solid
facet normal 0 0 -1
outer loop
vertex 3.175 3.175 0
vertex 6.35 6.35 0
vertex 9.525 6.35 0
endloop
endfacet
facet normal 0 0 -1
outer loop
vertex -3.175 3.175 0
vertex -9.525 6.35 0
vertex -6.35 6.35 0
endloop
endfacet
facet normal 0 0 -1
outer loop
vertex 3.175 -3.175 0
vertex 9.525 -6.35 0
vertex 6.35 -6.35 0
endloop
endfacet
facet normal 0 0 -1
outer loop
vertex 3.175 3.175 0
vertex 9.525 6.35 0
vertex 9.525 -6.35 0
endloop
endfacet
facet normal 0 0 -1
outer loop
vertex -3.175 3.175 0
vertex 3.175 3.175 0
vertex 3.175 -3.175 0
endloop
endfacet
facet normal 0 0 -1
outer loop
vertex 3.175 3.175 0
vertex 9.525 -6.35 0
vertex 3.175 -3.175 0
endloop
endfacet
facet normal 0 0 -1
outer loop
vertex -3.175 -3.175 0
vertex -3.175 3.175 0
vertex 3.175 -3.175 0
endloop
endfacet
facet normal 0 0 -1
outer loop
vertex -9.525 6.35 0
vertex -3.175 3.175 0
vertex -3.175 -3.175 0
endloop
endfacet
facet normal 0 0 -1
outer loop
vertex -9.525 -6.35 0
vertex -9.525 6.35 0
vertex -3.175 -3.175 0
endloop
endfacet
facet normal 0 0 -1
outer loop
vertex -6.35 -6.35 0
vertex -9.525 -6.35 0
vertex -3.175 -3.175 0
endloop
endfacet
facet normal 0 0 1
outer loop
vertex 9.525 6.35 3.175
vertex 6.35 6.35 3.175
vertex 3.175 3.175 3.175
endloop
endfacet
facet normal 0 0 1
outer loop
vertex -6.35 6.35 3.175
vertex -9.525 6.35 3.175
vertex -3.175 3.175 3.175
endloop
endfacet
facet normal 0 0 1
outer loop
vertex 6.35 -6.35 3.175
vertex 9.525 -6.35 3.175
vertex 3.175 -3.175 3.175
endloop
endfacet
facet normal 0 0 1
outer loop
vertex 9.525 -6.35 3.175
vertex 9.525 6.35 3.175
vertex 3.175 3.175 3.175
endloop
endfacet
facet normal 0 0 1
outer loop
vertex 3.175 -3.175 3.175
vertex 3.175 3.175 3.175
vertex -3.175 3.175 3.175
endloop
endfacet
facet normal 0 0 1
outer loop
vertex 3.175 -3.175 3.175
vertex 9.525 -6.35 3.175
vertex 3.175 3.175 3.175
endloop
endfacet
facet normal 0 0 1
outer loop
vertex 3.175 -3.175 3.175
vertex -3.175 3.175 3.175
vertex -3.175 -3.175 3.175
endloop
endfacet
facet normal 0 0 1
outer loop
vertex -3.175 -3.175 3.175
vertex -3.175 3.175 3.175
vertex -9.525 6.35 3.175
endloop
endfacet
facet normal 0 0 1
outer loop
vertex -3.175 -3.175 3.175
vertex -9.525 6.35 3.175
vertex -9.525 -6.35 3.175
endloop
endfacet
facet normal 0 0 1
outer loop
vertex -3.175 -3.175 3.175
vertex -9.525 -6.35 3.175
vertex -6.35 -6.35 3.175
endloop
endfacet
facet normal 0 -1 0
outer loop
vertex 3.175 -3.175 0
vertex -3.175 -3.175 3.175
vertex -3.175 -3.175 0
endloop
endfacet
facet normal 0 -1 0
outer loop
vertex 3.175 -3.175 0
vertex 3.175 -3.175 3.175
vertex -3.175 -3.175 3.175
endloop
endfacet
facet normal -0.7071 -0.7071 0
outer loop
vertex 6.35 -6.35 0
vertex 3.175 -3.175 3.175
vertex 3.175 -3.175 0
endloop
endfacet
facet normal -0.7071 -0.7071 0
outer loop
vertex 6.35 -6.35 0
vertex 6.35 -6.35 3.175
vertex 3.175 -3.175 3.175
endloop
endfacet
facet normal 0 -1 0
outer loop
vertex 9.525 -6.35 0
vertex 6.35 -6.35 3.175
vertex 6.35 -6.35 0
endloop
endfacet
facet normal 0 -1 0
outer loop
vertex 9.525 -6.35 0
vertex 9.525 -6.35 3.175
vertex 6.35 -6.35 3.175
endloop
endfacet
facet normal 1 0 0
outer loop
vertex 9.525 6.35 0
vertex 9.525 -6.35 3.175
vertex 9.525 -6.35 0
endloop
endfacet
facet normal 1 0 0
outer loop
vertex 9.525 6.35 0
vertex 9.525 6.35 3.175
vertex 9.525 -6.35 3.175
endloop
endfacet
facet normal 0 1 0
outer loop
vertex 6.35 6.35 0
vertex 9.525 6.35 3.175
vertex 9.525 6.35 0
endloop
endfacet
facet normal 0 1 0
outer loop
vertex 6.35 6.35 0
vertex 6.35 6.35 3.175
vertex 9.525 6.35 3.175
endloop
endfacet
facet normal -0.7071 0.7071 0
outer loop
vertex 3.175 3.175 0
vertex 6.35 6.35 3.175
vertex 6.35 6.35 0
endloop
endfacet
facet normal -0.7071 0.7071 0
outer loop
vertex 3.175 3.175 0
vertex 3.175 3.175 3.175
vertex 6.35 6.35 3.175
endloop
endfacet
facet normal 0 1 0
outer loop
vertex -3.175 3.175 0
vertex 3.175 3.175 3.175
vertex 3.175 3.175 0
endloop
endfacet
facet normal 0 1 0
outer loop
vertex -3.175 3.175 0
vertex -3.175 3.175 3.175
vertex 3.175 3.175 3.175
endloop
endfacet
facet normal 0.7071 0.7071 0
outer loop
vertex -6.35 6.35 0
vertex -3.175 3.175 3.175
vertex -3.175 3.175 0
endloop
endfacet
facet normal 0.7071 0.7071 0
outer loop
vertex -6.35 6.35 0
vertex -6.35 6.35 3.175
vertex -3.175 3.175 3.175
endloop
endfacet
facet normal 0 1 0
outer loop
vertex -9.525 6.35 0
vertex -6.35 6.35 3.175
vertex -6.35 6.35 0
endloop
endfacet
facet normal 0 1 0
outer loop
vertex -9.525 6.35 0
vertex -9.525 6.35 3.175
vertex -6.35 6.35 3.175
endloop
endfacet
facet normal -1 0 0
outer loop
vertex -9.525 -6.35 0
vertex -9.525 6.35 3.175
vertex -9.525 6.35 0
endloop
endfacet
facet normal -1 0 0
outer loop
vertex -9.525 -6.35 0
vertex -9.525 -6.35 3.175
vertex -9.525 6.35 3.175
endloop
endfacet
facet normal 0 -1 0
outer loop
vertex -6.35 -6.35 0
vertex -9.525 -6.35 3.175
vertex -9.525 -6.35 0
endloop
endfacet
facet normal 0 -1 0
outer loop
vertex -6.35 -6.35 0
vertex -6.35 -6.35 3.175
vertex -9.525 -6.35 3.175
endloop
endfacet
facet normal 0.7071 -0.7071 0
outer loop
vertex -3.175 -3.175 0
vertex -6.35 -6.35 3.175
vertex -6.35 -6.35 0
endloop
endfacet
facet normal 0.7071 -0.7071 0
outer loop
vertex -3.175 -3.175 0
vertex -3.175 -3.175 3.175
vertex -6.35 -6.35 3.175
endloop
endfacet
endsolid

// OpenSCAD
// file: ../lib/BowtieLib-v0.scad
// Minimally-altered copy of BowtieLib from ProjectNotes2/2023/3DPrinting/BowtieConnector/BowtieLib.scad

inch = 25.4;

bowtie_point_data = [
	// X, Y (length/6), offsetX, offsetY (caller units)
	[-3, 2,-1  , 1],
	[-2, 2, 0.5, 1],
	[-1, 1, 0.5, 1],
	[ 1, 1,-0.5, 1],
	[ 2, 2,-0.5, 1],
	[ 3, 2, 1  , 1],
	[ 3,-2, 1  ,-1],
	[ 2,-2,-0.5,-1],
	[ 1,-1,-0.5,-1],
	[-1,-1, 0.5,-1],
	[-2,-2, 0.5,-1],
	[-3,-2,-1  ,-1]
];

module beveled_square(size, r) {
	x0 = -size[0]/2;
	x1 = +size[0]/2;
	y0 = -size[1]/2;
	y1 = +size[1]/2;
	polygon([
		[x0+r, y0  ],
		[x0  , y0+r],
		[x0  , y1-r],
		[x0+r, y1  ],
		[x1-r, y1  ],
		[x1  , y1-r],
		[x1  , y0+r],
		[x1-r, y0  ]
	]);
}

module rounded_square(size, r) {
	hull() {
		for( xm=[-1,1] ) for( ym=[-1,1] ) {
			translate([xm*(size[0]/2-r), ym*(size[1]/2-r)]) circle(r=r);
		}
		// To ensure fullness at small $fns:
		beveled_square(size, r);
	}
}

function grid_cell_center_positions(area_size, cell_size) = [
	for( y=[ -area_size[1]/2+cell_size[1]/2 : cell_size[1] : area_size[1]/2-cell_size[1]/2 ] )
		for( x=[ -area_size[0]/2+cell_size[0]/2 : cell_size[0] : area_size[0]/2-cell_size[0]/2 ] )
			[x,y]
];

/**
 * Given point data of the form
 * [
 *   [x, y, offset_x, offset_y],
 *   ...
 * ]
 * 
 * Returns a list of points where x and y are multiplied by base_multiplier
 * and have offset multiplied by offseT_multiplier added to them.
 */
function offset_points( point_data, base_multiplier, offset_multiplier ) = [
	for( d=point_data ) [d[0]*base_multiplier + d[2]*offset_multiplier, d[1]*base_multiplier + d[3]*offset_multiplier]
];

function bowtie_connector_points( length, offset=0 ) =
	offset_points(bowtie_point_data, length/6, offset);
	//for( d=bowtie_point_data ) [d[0]*length/6 + d[2]*offset, d[1]*length/6 + d[3]*offset];

module bowtie_connector_2d( length, r_offset=0 ) {
	polygon( bowtie_connector_points(length, r_offset) );
}

function is3QuarterInch(number) = round(number*100) == 1905;

// Closest to the angular bowtie of whose shape a a hole could be cut using a quarter-inch diameter router bit
module quarter_bit_cutout_bowtie(length, r_offset) {
	if( !is3QuarterInch(length) ) {
		assert(false, str("'quarter-bit-cutout' bowtie requires length to be 3/4*inch, i.e. 19.05mm; given ", length));
	}
	inner_rad = 1/8*inch + r_offset;
	outer_rad = 1/8*inch - r_offset;
	difference() {
		union() {
			square([4/8*inch, 3/8*inch], center=true);
			for( xm=[-1,1] ) hull() {
				translate([-77/256*inch*xm,  1/8*inch]) circle(r=inner_rad);
				translate([-45/256*inch*xm,  0          ]) circle(r=inner_rad);
				translate([-77/256*inch*xm, -1/8*inch]) circle(r=inner_rad);
			}
		}
		for( ym=[-1,1] ) hull() for( xm=[-1,1] ) {
			translate([19/256*inch*xm, 1/4*inch*ym]) circle(r=outer_rad);
			translate([(1+19/256)*inch*xm, (1+1/4)*inch*ym]) circle(r=outer_rad);
		}
	}
}

// One that will fit into hole made for a rounded one or a straight-edged one
module minimal_bowtie(length, r_offset) {
	if( !is3QuarterInch(length) ) {
		assert(false, str("'minimal' bowtie requires length to be 3/4*inch, i.e. 19.05mm; given ", length));
	}
	intersection() {
		bowtie_connector_2d(length, r_offset);
		quarter_bit_cutout_bowtie(length, r_offset);
	}
}
module maximal_bowtie(length, r_offset) {
	if( !is3QuarterInch(length) ) {
		assert(false, str("'maximal' bowtie requires length to be 3/4*inch, i.e. 19.05mm; given ", length));
	}
	union() {
		bowtie_connector_2d(length, r_offset);
		quarter_bit_cutout_bowtie(length, r_offset);
	}
}
// A good choice for holes meant to accomodate angled or round bowties
module semi_maximal_bowtie(length, r_offset) {
	if( !is3QuarterInch(length) ) {
		assert(false, str("'semi-maximal' bowtie requires length to be 3/4*inch, i.e. 19.05mm; given ", length));
	}
	union() {
		bowtie_connector_2d(3/4*inch, r_offset);
		intersection() {
			quarter_bit_cutout_bowtie(length, r_offset);
			square([3/4*inch + r_offset*2, 1/2*inch + r_offset*2], center=true);
		}
	}
}

module bowtie_of_style(style_name, length, r_offset) {
	if( style_name == "angular" ) {
		bowtie_connector_2d(length, r_offset);
	} else if( style_name == "quarter-bit-cutout" ) {
		quarter_bit_cutout_bowtie(length, r_offset);
	} else if( style_name == "maximal" ) {
		maximal_bowtie(length, r_offset);
	} else if( style_name == "minimal" ) {
		minimal_bowtie(length, r_offset);
	} else if( style_name == "semi-maximal" ) {
		semi_maximal_bowtie(length, r_offset);
	} else {
		assert(false, str("Unsupported bowtie style: '",style_name, "'") ); // lolmao
	}
}

function fencepost_positions_ofe(length, unit_length, offset_from_ends) = [
	for( i=[-length/2 + offset_from_ends : unit_length : +length/2 - offset_from_ends + 0.01] ) i
];
// TODO: hese two could be rewritten in terms of fencepost_positions_ofe
function fencepost_positions(length, unit_length, include_ends) = [
	for( i=[-length/2 + (include_ends ? 0 : unit_length) : unit_length : +length/2 - (include_ends ? 0 : unit_length)] ) i
];
function fencebeam_positions(length, unit_length, include_ends) = [
	for( i=[-length/2 + (include_ends ? unit_length/2 : 3*unit_length/2) : unit_length : +length/2 + 0.01 - (include_ends ? unit_length/2 : 3*unit_length/2)] ) i
];

function fencepost_positions_ofe_2d(area_size, cell_size, offset_from_ends) = [
	for( y=fencepost_positions_ofe(area_size[1], cell_size[1], offset_from_ends) )
		for( x=fencepost_positions_ofe(area_size[0], cell_size[0], offset_from_ends) )
			[x,y]
];

function bowtie_positions(panel_size, unit_size, offset_from_ends) = [
	for( y=fencepost_positions_ofe(panel_size[1], unit_size[1], offset_from_ends) )
	     for( x=[-panel_size[0]/2, panel_size[0]/2] )
		[x,y,0],
	for( x=fencepost_positions_ofe(panel_size[0], unit_size[0], offset_from_ends) )
	     for( y=[-panel_size[1]/2, panel_size[1]/2] )
		[x,y,90],
];

module bowtie_test_plate_2d(panel_size, bowtie_length, offset, corner_radius=3.175, bowtie_position_offset=1, bowtie_style="semi-maximal") {
	difference() {
		beveled_square([panel_size[0]+offset*2, panel_size[1]+offset*2], corner_radius);
		for( pos=bowtie_positions(panel_size, [bowtie_length, bowtie_length], bowtie_position_offset*bowtie_length ) ) {
			translate([pos[0],pos[1]]) rotate([0,0,pos[2]]) bowtie_of_style(bowtie_style, bowtie_length, -offset);
		}
		if( bowtie_position_offset == 0.5 ) {
			// Chop off corners
			for( r=[0:90:270] ) rotate([0,0,r]) {
				translate([bowtie_length*2, bowtie_length*2]) square([bowtie_length, bowtie_length], center=true);
			}
		}
	}
}

// Flathead screw profile data:
// [head_surface_diam, head_base_diam, head_height]

module countersunk_hole(head_surface_diam, head_height, shaft_diam, hole_depth) {
	cylinder(d1=shaft_diam, d2=head_surface_diam+(head_surface_diam-shaft_diam), h=head_height*2, center=true);
	translate([0,0,-hole_depth/2]) cylinder(d=shaft_diam, h=hole_depth, center=true);
}
// main file
panel_size = [38.1, 38.1];
// Long length of bowtie; 3/4" = 19.05
bowtie_length = 19.05;
bowtie_style = "angular"; // ["angular","minimal","quarter-bit-cutout","maximal","semi-maximal"]
thickness = 3.175;

// 1/4" = 6.35
// 3/8" = 9.525
// 1/2" = 12.7

$fn = 40;

include <../lib/BowtieLib-v0.scad>;

linear_extrude(thickness) {
	bowtie_of_style(bowtie_style, bowtie_length, 0);
}
